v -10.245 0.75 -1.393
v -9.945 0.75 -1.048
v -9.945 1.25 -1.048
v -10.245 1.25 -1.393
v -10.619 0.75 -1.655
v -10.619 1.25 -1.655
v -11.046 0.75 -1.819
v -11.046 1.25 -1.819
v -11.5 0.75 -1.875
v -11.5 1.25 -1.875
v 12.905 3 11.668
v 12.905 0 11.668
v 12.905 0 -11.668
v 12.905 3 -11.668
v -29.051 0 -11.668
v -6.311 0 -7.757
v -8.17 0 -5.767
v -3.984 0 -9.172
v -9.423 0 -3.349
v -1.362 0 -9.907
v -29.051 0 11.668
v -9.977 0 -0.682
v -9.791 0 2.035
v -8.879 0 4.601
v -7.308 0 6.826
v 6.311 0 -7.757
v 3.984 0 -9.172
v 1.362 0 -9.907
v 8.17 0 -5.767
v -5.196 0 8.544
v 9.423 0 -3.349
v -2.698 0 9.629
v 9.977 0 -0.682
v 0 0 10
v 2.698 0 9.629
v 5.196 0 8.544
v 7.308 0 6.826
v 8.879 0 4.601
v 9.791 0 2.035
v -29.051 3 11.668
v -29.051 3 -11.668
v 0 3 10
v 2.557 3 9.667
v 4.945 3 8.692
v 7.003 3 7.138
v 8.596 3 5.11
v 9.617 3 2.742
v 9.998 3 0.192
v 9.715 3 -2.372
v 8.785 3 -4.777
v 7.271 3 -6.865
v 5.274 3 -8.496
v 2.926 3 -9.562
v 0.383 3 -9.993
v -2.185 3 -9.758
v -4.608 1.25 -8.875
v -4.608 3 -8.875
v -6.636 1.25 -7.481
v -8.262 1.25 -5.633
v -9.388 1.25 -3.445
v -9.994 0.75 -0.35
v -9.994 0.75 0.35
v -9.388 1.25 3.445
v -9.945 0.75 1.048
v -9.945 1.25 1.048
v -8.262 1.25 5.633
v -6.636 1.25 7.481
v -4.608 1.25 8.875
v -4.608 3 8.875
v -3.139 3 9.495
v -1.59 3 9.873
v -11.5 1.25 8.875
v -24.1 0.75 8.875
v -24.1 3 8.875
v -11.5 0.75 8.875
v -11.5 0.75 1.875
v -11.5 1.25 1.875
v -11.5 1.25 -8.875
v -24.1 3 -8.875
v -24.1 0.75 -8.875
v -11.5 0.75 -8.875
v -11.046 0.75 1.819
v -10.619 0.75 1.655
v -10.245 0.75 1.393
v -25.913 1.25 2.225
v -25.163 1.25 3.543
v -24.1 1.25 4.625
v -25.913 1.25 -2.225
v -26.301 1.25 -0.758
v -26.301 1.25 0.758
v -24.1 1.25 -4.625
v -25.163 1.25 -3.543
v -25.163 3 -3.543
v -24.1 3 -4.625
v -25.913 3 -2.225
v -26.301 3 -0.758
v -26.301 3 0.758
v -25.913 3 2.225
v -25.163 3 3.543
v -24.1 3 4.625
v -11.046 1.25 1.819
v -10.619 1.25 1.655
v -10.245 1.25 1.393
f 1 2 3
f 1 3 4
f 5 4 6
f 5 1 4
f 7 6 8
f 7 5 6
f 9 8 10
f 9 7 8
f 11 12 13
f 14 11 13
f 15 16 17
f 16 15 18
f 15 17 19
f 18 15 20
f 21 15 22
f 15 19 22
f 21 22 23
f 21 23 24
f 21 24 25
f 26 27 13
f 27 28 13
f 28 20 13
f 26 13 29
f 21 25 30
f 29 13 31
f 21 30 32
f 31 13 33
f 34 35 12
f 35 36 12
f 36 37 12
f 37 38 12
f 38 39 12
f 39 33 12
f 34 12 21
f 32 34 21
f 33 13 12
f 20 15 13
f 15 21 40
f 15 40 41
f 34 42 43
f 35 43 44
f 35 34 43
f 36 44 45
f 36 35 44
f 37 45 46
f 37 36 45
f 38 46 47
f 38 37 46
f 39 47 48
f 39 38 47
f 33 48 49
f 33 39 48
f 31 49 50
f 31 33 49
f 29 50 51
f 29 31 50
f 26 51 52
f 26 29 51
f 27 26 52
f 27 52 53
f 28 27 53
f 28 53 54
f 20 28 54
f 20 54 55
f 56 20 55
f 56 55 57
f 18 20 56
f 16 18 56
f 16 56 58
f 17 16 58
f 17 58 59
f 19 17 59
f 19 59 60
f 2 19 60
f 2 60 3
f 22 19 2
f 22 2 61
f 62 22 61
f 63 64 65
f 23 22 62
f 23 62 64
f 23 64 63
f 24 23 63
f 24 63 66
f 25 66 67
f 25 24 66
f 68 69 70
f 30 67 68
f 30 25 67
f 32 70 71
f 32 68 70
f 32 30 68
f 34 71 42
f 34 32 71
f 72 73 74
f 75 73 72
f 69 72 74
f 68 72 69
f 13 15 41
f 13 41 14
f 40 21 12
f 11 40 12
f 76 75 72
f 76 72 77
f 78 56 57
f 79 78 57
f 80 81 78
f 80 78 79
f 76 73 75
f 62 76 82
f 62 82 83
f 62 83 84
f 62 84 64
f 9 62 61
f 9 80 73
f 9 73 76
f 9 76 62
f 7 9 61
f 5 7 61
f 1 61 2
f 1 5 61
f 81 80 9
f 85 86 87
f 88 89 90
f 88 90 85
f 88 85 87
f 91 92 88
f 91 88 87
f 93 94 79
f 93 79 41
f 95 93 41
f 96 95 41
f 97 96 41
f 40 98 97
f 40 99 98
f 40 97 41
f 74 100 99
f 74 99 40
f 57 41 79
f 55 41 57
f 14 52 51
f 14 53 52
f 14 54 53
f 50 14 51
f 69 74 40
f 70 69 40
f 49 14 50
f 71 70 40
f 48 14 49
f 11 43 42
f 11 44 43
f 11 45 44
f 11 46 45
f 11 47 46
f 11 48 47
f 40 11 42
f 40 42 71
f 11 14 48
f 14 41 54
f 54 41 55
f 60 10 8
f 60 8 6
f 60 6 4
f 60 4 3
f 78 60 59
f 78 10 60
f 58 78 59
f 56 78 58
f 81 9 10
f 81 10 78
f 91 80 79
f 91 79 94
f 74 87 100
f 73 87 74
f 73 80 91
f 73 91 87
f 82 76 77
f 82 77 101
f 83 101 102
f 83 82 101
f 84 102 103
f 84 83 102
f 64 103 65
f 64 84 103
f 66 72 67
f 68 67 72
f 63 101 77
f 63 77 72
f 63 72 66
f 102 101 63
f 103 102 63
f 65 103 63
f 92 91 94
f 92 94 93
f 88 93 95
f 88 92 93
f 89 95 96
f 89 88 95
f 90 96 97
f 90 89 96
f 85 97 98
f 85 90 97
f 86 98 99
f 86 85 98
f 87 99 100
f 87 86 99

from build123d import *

# Parameters (mm, degrees)
SKETCH1_R               = 50
SKETCH1_R_2             = 10
BOSS_EXTRUDE1_DEPTH     = 3
BOSS_EXTRUDE2_DEPTH     = 2.5
CAVITY2_START           = 0.75
CAVITY2_DEPTH           = 2.25
CAVITY2_START_2         = 1.25
CAVITY2_2_DEPTH         = 1.75
FILLET1_R               = 0.5
FILLET2_R               = 7
CUT_EXTRUDE2_DEPTH      = 76.690157881
CUT_EXTRUDE2_DEPTH_BACK = 76.690157881
SKETCH3_R               = 50
SKETCH3_W               = 41.955661048
SKETCH3_H               = 23.335406012


# Read off the part's stored shape, not the designer's step: Cavity2
with BuildPart() as part:
    # Sketch1 → Boss-Extrude1 (new body)
    with BuildSketch(Plane(origin=(0, 0, 0), x_dir=(1, 0, 0), z_dir=(0, 1, 0))):
        with Locations(Location((0, 0, 0), (0, 0, 270))):
            Circle(SKETCH1_R)
        with Locations(Location((0, 0, 0), (0, 0, 270))):
            Circle(SKETCH1_R_2, mode=Mode.SUBTRACT)
    extrude(amount=BOSS_EXTRUDE1_DEPTH)

    # Sketch2 → Boss-Extrude2 (add, symmetric)
    with BuildSketch(Plane.XY.offset(-25)):
        Polygon((-17.5, 3), (-10.5, 3), (-10.5, 23), (30.5, 23), (30.5, 3), (37.5, 3), (37.5, 30), (-17.5, 30), align=None)
    extrude(amount=BOSS_EXTRUDE2_DEPTH, both=True)

    # Cavity2 outline → Cavity2 (cut)
    with BuildSketch(Plane(origin=(0, 0, 0), x_dir=(1, 0, 0), z_dir=(0, 1, 0)).offset(CAVITY2_START)):
        with BuildLine():
            ThreePointArc((-9.944972826, -1.047623734), (-10, 0), (-9.944972826, 1.047623734))
            ThreePointArc((-9.944972826, 1.047623734), (-10.619281402, 1.655282378), (-11.5, 1.875))
            Line((-11.5, 1.875), (-11.5, 8.875))
            Line((-11.5, 8.875), (-24.1, 8.875))
            Line((-24.1, 8.875), (-24.1, -8.875))
            Line((-24.1, -8.875), (-11.5, -8.875))
            Line((-11.5, -8.875), (-11.5, -1.875))
            ThreePointArc((-11.5, -1.875), (-10.619281402, -1.655282378), (-9.944972826, -1.047623734))
        make_face()
    extrude(amount=CAVITY2_DEPTH, mode=Mode.SUBTRACT)

    # Cavity2 2 outline → Cavity2 2 (cut)
    with BuildSketch(Plane(origin=(0, 0, 0), x_dir=(1, 0, 0), z_dir=(0, 1, 0)).offset(CAVITY2_START_2)):
        with BuildLine():
            ThreePointArc((-11.5, 1.875), (-10.619281402, 1.655282378), (-9.944972826, 1.047623734))
            ThreePointArc((-9.944972826, 1.047623734), (-8.262249735, 5.633402996), (-4.608077148, 8.875))
            Line((-4.608077148, 8.875), (-11.5, 8.875))
            Line((-11.5, 8.875), (-11.5, 1.875))
        make_face()
        with BuildLine():
            ThreePointArc((-4.608077148, -8.875), (-8.262249735, -5.633402996), (-9.944972826, -1.047623734))
            ThreePointArc((-9.944972826, -1.047623734), (-10.619281402, -1.655282378), (-11.5, -1.875))
            Line((-11.5, -1.875), (-11.5, -8.875))
            Line((-11.5, -8.875), (-4.608077148, -8.875))
        make_face()
        with BuildLine():
            Line((-24.1, -4.625), (-24.1, 4.625))
            ThreePointArc((-24.1, 4.625), (-26.35, 0), (-24.1, -4.625))
        make_face()
    extrude(amount=CAVITY2_2_DEPTH, mode=Mode.SUBTRACT)

    # Fillet1
    fillet1_edges = [part.edges().sort_by_distance(p)[0] for p in [
        (-14, 3, -22.5),
        (-17.5, 3, -25),
        (34, 3, -27.5),
        (37.5, 3, -25),
        (-14, 3, -27.5),
        (34, 3, -22.5),
    ]]
    fillet(fillet1_edges, radius=FILLET1_R)

    # Fillet2
    fillet2_edges = [part.edges().sort_by_distance(p)[0] for p in [
        (-17.5, 30, -25),
        (37.5, 30, -25),
    ]]
    fillet(fillet2_edges, radius=FILLET2_R)

    # Sketch3 → Cut-Extrude2 (cut, two sides: drawn at the far end of the back side and taken through both)
    with BuildSketch(Plane(origin=(0, 3, 0), x_dir=(1, 0, 0), z_dir=(0, 1, 0)).offset(-CUT_EXTRUDE2_DEPTH_BACK)):
        Circle(SKETCH3_R)
        with Locations((-8.073248433, 0)):
            Rectangle(SKETCH3_W, SKETCH3_H, mode=Mode.SUBTRACT)
    extrude(amount=CUT_EXTRUDE2_DEPTH + CUT_EXTRUDE2_DEPTH_BACK, mode=Mode.SUBTRACT)


solid = part.part
